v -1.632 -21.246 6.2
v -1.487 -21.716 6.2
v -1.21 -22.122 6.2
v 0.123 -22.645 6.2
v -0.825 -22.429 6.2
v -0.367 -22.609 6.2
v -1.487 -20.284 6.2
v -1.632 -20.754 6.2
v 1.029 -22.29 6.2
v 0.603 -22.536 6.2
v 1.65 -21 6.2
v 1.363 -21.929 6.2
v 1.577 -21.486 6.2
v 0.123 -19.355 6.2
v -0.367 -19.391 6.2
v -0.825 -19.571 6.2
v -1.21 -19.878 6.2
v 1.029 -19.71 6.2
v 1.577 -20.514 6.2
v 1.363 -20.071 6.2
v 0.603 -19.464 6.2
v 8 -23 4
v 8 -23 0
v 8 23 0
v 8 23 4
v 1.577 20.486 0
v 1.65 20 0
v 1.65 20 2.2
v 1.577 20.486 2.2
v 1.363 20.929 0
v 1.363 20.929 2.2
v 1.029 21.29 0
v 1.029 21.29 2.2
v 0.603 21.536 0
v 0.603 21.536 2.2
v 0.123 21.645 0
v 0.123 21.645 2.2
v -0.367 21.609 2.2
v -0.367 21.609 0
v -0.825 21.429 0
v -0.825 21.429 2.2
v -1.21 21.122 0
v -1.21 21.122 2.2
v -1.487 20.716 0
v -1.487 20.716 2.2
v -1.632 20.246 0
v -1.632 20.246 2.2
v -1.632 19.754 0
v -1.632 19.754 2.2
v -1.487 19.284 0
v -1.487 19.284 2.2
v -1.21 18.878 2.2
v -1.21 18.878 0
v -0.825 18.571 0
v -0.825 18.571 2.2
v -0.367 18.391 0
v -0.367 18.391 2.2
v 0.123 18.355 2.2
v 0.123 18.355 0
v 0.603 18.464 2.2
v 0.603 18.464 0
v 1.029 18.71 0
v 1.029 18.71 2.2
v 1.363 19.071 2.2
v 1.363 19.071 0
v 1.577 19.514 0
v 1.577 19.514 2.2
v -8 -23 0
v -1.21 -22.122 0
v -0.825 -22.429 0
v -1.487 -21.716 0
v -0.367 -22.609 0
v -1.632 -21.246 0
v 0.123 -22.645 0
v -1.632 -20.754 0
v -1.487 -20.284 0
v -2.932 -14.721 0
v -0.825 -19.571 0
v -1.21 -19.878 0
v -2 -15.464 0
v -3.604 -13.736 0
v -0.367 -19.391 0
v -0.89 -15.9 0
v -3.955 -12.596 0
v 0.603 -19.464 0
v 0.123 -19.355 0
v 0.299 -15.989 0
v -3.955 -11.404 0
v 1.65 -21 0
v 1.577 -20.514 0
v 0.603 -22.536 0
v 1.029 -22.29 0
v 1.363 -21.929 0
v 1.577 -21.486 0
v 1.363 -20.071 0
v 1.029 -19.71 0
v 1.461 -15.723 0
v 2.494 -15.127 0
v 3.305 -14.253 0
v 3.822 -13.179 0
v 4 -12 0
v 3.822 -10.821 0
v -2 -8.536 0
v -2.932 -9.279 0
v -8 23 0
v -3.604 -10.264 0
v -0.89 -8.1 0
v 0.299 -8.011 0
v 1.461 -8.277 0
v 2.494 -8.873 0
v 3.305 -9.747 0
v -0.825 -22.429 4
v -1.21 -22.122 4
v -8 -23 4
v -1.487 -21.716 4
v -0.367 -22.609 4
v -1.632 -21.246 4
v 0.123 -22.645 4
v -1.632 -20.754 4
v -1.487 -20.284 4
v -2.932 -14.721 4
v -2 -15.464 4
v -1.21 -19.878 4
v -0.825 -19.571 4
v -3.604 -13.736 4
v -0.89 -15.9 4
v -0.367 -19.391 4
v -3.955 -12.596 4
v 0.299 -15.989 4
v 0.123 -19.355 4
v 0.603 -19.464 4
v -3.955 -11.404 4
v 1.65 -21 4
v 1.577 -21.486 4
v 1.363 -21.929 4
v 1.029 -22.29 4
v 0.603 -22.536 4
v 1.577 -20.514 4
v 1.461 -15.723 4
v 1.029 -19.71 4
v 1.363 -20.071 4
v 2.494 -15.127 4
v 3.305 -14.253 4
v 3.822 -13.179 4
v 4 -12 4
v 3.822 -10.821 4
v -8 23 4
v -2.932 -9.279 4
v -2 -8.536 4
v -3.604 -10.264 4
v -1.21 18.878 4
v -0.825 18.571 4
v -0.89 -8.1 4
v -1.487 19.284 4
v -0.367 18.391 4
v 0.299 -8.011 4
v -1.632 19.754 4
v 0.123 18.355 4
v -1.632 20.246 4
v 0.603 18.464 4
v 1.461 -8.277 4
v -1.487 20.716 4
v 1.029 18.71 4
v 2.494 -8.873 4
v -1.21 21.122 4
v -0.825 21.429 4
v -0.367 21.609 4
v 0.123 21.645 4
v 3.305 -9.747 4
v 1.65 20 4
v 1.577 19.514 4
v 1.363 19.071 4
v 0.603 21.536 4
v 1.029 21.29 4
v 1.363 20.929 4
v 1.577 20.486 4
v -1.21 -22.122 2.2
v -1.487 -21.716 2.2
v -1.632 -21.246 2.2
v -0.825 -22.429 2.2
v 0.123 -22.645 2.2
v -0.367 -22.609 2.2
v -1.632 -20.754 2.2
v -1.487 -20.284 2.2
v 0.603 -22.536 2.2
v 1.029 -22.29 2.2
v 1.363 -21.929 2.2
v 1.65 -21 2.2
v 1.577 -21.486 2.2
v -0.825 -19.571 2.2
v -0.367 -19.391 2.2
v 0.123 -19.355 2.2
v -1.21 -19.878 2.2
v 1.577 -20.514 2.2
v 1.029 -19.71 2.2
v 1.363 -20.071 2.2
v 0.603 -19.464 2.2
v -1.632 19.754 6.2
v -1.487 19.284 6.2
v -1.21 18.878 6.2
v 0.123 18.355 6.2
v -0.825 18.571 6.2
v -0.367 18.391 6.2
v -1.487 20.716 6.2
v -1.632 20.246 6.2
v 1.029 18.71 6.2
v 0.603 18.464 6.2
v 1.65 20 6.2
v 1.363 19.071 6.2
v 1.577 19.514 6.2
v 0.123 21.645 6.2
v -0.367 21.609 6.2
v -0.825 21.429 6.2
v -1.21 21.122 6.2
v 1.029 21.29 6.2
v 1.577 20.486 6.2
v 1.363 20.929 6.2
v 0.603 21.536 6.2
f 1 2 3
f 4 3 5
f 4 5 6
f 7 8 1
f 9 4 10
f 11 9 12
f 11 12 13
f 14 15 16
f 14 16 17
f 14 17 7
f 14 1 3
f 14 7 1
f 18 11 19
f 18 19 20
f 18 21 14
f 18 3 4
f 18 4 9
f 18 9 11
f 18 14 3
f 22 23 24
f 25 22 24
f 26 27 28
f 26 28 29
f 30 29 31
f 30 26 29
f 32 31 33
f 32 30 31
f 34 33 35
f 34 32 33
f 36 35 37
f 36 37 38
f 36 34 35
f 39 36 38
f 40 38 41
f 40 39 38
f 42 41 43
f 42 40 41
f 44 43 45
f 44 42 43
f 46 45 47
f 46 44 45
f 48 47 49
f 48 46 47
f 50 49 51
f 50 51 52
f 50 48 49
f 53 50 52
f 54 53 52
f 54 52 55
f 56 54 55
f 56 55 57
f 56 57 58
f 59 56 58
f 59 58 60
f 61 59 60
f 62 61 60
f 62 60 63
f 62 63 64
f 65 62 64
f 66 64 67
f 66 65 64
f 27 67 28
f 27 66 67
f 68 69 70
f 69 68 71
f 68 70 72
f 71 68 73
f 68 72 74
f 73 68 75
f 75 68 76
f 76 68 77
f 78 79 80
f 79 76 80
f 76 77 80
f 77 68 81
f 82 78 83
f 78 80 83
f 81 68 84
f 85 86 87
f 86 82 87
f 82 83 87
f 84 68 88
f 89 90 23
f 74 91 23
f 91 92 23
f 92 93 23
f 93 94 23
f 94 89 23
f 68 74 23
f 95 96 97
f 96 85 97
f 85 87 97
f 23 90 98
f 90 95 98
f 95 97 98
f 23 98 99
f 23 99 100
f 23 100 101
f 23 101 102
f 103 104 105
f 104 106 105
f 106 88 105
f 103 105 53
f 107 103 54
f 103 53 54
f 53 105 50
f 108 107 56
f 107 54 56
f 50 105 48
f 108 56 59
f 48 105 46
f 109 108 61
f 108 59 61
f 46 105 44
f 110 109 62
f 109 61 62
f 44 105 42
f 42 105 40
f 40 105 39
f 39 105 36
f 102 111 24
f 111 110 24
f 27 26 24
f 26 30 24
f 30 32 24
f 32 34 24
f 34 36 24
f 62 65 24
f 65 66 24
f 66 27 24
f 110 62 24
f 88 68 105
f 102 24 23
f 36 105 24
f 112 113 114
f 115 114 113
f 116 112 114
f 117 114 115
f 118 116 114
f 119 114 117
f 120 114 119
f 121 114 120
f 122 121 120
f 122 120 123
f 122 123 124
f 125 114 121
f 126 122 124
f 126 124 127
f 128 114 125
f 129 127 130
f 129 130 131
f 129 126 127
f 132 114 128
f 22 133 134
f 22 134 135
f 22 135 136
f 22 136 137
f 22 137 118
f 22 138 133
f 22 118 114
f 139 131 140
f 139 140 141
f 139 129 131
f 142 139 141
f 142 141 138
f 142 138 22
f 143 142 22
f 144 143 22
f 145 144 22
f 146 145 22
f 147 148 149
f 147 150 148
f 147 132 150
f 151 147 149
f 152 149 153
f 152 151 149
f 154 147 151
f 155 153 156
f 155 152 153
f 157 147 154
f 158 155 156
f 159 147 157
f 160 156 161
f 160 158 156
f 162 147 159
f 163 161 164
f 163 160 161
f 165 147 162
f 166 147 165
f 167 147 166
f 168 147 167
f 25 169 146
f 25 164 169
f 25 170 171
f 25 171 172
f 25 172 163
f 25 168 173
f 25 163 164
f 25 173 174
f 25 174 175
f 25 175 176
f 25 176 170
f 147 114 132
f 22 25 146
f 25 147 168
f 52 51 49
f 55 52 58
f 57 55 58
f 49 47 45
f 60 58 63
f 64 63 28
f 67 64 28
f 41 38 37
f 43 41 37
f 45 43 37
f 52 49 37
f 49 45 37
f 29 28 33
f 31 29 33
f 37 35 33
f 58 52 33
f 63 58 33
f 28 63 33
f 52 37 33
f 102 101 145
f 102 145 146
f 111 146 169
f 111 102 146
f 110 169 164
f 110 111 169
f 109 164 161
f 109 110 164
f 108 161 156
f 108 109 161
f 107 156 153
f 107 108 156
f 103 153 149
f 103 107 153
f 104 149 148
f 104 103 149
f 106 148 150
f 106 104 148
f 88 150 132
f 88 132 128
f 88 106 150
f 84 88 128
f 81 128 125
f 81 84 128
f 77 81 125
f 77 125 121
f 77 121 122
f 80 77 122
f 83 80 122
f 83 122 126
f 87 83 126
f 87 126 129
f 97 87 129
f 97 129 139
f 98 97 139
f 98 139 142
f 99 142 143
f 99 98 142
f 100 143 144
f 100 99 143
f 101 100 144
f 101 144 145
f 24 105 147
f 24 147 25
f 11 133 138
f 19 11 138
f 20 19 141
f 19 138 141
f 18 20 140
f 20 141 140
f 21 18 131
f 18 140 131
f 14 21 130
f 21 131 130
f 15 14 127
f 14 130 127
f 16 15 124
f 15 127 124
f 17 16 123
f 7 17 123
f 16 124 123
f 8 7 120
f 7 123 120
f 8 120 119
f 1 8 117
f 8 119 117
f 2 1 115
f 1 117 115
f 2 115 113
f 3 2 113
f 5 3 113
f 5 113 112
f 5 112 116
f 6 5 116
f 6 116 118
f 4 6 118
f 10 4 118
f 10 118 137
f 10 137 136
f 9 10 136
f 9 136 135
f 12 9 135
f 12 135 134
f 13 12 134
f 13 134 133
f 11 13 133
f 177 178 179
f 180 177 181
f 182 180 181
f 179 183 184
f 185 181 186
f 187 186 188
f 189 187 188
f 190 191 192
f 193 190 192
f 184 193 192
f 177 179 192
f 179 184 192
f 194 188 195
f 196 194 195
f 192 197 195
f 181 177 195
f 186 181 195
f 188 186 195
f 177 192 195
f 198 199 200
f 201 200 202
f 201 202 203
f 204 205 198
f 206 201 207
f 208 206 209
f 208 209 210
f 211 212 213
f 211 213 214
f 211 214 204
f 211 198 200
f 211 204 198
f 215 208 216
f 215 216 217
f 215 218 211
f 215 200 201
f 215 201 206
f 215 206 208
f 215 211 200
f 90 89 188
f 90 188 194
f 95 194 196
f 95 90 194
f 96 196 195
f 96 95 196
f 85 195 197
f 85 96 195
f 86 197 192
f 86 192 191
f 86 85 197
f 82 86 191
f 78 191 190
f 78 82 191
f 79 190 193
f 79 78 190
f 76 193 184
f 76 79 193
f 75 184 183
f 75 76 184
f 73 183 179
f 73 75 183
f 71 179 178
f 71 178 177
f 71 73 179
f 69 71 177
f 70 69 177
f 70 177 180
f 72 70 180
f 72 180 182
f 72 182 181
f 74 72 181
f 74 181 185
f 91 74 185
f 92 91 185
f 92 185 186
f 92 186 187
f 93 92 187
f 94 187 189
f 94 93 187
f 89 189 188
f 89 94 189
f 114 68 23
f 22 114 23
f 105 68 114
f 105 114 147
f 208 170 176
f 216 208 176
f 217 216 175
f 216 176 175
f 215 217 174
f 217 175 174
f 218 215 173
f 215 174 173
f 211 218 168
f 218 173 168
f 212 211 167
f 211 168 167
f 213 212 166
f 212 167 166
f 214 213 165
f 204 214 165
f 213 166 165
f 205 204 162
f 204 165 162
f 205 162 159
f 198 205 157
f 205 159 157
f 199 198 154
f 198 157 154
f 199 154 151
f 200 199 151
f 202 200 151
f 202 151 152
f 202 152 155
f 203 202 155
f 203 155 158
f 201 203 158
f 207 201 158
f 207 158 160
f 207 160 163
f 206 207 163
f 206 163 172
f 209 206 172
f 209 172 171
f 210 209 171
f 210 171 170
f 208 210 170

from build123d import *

# Parameters (mm, degrees)
F0_W     = 16
F0_H     = 46
F0_R     = 1.65
F0_R_2   = 4
F1_DEPTH = 4
F2_DEPTH = 6.2
F3_DEPTH = 2.2


with BuildPart() as f1:
    # F0 (on Top) → F1 (new body)
    with BuildSketch(Plane.XY):
        Rectangle(F0_W, F0_H)
        with Locations((0, -21)):
            Circle(F0_R, mode=Mode.SUBTRACT)
        with Locations((0, -12)):
            Circle(F0_R_2, mode=Mode.SUBTRACT)
        with Locations((0, 20)):
            Circle(F0_R, mode=Mode.SUBTRACT)
        with Locations((0, 20)):
            Circle(F0_R)
        with Locations((0, -21)):
            Circle(F0_R)
    extrude(amount=F1_DEPTH)

    # F0 (on Top) → F2 (join)
    with BuildSketch(Plane.XY):
        with Locations((0, 20)):
            Circle(F0_R)
        with Locations((0, -21)):
            Circle(F0_R)
    extrude(amount=F2_DEPTH)

    # F0 (on Top) → F3 (cut)
    with BuildSketch(Plane.XY):
        with Locations((0, -21)):
            Circle(F0_R)
        with Locations((0, 20)):
            Circle(F0_R)
    extrude(amount=F3_DEPTH, mode=Mode.SUBTRACT)


solid = f1.part
